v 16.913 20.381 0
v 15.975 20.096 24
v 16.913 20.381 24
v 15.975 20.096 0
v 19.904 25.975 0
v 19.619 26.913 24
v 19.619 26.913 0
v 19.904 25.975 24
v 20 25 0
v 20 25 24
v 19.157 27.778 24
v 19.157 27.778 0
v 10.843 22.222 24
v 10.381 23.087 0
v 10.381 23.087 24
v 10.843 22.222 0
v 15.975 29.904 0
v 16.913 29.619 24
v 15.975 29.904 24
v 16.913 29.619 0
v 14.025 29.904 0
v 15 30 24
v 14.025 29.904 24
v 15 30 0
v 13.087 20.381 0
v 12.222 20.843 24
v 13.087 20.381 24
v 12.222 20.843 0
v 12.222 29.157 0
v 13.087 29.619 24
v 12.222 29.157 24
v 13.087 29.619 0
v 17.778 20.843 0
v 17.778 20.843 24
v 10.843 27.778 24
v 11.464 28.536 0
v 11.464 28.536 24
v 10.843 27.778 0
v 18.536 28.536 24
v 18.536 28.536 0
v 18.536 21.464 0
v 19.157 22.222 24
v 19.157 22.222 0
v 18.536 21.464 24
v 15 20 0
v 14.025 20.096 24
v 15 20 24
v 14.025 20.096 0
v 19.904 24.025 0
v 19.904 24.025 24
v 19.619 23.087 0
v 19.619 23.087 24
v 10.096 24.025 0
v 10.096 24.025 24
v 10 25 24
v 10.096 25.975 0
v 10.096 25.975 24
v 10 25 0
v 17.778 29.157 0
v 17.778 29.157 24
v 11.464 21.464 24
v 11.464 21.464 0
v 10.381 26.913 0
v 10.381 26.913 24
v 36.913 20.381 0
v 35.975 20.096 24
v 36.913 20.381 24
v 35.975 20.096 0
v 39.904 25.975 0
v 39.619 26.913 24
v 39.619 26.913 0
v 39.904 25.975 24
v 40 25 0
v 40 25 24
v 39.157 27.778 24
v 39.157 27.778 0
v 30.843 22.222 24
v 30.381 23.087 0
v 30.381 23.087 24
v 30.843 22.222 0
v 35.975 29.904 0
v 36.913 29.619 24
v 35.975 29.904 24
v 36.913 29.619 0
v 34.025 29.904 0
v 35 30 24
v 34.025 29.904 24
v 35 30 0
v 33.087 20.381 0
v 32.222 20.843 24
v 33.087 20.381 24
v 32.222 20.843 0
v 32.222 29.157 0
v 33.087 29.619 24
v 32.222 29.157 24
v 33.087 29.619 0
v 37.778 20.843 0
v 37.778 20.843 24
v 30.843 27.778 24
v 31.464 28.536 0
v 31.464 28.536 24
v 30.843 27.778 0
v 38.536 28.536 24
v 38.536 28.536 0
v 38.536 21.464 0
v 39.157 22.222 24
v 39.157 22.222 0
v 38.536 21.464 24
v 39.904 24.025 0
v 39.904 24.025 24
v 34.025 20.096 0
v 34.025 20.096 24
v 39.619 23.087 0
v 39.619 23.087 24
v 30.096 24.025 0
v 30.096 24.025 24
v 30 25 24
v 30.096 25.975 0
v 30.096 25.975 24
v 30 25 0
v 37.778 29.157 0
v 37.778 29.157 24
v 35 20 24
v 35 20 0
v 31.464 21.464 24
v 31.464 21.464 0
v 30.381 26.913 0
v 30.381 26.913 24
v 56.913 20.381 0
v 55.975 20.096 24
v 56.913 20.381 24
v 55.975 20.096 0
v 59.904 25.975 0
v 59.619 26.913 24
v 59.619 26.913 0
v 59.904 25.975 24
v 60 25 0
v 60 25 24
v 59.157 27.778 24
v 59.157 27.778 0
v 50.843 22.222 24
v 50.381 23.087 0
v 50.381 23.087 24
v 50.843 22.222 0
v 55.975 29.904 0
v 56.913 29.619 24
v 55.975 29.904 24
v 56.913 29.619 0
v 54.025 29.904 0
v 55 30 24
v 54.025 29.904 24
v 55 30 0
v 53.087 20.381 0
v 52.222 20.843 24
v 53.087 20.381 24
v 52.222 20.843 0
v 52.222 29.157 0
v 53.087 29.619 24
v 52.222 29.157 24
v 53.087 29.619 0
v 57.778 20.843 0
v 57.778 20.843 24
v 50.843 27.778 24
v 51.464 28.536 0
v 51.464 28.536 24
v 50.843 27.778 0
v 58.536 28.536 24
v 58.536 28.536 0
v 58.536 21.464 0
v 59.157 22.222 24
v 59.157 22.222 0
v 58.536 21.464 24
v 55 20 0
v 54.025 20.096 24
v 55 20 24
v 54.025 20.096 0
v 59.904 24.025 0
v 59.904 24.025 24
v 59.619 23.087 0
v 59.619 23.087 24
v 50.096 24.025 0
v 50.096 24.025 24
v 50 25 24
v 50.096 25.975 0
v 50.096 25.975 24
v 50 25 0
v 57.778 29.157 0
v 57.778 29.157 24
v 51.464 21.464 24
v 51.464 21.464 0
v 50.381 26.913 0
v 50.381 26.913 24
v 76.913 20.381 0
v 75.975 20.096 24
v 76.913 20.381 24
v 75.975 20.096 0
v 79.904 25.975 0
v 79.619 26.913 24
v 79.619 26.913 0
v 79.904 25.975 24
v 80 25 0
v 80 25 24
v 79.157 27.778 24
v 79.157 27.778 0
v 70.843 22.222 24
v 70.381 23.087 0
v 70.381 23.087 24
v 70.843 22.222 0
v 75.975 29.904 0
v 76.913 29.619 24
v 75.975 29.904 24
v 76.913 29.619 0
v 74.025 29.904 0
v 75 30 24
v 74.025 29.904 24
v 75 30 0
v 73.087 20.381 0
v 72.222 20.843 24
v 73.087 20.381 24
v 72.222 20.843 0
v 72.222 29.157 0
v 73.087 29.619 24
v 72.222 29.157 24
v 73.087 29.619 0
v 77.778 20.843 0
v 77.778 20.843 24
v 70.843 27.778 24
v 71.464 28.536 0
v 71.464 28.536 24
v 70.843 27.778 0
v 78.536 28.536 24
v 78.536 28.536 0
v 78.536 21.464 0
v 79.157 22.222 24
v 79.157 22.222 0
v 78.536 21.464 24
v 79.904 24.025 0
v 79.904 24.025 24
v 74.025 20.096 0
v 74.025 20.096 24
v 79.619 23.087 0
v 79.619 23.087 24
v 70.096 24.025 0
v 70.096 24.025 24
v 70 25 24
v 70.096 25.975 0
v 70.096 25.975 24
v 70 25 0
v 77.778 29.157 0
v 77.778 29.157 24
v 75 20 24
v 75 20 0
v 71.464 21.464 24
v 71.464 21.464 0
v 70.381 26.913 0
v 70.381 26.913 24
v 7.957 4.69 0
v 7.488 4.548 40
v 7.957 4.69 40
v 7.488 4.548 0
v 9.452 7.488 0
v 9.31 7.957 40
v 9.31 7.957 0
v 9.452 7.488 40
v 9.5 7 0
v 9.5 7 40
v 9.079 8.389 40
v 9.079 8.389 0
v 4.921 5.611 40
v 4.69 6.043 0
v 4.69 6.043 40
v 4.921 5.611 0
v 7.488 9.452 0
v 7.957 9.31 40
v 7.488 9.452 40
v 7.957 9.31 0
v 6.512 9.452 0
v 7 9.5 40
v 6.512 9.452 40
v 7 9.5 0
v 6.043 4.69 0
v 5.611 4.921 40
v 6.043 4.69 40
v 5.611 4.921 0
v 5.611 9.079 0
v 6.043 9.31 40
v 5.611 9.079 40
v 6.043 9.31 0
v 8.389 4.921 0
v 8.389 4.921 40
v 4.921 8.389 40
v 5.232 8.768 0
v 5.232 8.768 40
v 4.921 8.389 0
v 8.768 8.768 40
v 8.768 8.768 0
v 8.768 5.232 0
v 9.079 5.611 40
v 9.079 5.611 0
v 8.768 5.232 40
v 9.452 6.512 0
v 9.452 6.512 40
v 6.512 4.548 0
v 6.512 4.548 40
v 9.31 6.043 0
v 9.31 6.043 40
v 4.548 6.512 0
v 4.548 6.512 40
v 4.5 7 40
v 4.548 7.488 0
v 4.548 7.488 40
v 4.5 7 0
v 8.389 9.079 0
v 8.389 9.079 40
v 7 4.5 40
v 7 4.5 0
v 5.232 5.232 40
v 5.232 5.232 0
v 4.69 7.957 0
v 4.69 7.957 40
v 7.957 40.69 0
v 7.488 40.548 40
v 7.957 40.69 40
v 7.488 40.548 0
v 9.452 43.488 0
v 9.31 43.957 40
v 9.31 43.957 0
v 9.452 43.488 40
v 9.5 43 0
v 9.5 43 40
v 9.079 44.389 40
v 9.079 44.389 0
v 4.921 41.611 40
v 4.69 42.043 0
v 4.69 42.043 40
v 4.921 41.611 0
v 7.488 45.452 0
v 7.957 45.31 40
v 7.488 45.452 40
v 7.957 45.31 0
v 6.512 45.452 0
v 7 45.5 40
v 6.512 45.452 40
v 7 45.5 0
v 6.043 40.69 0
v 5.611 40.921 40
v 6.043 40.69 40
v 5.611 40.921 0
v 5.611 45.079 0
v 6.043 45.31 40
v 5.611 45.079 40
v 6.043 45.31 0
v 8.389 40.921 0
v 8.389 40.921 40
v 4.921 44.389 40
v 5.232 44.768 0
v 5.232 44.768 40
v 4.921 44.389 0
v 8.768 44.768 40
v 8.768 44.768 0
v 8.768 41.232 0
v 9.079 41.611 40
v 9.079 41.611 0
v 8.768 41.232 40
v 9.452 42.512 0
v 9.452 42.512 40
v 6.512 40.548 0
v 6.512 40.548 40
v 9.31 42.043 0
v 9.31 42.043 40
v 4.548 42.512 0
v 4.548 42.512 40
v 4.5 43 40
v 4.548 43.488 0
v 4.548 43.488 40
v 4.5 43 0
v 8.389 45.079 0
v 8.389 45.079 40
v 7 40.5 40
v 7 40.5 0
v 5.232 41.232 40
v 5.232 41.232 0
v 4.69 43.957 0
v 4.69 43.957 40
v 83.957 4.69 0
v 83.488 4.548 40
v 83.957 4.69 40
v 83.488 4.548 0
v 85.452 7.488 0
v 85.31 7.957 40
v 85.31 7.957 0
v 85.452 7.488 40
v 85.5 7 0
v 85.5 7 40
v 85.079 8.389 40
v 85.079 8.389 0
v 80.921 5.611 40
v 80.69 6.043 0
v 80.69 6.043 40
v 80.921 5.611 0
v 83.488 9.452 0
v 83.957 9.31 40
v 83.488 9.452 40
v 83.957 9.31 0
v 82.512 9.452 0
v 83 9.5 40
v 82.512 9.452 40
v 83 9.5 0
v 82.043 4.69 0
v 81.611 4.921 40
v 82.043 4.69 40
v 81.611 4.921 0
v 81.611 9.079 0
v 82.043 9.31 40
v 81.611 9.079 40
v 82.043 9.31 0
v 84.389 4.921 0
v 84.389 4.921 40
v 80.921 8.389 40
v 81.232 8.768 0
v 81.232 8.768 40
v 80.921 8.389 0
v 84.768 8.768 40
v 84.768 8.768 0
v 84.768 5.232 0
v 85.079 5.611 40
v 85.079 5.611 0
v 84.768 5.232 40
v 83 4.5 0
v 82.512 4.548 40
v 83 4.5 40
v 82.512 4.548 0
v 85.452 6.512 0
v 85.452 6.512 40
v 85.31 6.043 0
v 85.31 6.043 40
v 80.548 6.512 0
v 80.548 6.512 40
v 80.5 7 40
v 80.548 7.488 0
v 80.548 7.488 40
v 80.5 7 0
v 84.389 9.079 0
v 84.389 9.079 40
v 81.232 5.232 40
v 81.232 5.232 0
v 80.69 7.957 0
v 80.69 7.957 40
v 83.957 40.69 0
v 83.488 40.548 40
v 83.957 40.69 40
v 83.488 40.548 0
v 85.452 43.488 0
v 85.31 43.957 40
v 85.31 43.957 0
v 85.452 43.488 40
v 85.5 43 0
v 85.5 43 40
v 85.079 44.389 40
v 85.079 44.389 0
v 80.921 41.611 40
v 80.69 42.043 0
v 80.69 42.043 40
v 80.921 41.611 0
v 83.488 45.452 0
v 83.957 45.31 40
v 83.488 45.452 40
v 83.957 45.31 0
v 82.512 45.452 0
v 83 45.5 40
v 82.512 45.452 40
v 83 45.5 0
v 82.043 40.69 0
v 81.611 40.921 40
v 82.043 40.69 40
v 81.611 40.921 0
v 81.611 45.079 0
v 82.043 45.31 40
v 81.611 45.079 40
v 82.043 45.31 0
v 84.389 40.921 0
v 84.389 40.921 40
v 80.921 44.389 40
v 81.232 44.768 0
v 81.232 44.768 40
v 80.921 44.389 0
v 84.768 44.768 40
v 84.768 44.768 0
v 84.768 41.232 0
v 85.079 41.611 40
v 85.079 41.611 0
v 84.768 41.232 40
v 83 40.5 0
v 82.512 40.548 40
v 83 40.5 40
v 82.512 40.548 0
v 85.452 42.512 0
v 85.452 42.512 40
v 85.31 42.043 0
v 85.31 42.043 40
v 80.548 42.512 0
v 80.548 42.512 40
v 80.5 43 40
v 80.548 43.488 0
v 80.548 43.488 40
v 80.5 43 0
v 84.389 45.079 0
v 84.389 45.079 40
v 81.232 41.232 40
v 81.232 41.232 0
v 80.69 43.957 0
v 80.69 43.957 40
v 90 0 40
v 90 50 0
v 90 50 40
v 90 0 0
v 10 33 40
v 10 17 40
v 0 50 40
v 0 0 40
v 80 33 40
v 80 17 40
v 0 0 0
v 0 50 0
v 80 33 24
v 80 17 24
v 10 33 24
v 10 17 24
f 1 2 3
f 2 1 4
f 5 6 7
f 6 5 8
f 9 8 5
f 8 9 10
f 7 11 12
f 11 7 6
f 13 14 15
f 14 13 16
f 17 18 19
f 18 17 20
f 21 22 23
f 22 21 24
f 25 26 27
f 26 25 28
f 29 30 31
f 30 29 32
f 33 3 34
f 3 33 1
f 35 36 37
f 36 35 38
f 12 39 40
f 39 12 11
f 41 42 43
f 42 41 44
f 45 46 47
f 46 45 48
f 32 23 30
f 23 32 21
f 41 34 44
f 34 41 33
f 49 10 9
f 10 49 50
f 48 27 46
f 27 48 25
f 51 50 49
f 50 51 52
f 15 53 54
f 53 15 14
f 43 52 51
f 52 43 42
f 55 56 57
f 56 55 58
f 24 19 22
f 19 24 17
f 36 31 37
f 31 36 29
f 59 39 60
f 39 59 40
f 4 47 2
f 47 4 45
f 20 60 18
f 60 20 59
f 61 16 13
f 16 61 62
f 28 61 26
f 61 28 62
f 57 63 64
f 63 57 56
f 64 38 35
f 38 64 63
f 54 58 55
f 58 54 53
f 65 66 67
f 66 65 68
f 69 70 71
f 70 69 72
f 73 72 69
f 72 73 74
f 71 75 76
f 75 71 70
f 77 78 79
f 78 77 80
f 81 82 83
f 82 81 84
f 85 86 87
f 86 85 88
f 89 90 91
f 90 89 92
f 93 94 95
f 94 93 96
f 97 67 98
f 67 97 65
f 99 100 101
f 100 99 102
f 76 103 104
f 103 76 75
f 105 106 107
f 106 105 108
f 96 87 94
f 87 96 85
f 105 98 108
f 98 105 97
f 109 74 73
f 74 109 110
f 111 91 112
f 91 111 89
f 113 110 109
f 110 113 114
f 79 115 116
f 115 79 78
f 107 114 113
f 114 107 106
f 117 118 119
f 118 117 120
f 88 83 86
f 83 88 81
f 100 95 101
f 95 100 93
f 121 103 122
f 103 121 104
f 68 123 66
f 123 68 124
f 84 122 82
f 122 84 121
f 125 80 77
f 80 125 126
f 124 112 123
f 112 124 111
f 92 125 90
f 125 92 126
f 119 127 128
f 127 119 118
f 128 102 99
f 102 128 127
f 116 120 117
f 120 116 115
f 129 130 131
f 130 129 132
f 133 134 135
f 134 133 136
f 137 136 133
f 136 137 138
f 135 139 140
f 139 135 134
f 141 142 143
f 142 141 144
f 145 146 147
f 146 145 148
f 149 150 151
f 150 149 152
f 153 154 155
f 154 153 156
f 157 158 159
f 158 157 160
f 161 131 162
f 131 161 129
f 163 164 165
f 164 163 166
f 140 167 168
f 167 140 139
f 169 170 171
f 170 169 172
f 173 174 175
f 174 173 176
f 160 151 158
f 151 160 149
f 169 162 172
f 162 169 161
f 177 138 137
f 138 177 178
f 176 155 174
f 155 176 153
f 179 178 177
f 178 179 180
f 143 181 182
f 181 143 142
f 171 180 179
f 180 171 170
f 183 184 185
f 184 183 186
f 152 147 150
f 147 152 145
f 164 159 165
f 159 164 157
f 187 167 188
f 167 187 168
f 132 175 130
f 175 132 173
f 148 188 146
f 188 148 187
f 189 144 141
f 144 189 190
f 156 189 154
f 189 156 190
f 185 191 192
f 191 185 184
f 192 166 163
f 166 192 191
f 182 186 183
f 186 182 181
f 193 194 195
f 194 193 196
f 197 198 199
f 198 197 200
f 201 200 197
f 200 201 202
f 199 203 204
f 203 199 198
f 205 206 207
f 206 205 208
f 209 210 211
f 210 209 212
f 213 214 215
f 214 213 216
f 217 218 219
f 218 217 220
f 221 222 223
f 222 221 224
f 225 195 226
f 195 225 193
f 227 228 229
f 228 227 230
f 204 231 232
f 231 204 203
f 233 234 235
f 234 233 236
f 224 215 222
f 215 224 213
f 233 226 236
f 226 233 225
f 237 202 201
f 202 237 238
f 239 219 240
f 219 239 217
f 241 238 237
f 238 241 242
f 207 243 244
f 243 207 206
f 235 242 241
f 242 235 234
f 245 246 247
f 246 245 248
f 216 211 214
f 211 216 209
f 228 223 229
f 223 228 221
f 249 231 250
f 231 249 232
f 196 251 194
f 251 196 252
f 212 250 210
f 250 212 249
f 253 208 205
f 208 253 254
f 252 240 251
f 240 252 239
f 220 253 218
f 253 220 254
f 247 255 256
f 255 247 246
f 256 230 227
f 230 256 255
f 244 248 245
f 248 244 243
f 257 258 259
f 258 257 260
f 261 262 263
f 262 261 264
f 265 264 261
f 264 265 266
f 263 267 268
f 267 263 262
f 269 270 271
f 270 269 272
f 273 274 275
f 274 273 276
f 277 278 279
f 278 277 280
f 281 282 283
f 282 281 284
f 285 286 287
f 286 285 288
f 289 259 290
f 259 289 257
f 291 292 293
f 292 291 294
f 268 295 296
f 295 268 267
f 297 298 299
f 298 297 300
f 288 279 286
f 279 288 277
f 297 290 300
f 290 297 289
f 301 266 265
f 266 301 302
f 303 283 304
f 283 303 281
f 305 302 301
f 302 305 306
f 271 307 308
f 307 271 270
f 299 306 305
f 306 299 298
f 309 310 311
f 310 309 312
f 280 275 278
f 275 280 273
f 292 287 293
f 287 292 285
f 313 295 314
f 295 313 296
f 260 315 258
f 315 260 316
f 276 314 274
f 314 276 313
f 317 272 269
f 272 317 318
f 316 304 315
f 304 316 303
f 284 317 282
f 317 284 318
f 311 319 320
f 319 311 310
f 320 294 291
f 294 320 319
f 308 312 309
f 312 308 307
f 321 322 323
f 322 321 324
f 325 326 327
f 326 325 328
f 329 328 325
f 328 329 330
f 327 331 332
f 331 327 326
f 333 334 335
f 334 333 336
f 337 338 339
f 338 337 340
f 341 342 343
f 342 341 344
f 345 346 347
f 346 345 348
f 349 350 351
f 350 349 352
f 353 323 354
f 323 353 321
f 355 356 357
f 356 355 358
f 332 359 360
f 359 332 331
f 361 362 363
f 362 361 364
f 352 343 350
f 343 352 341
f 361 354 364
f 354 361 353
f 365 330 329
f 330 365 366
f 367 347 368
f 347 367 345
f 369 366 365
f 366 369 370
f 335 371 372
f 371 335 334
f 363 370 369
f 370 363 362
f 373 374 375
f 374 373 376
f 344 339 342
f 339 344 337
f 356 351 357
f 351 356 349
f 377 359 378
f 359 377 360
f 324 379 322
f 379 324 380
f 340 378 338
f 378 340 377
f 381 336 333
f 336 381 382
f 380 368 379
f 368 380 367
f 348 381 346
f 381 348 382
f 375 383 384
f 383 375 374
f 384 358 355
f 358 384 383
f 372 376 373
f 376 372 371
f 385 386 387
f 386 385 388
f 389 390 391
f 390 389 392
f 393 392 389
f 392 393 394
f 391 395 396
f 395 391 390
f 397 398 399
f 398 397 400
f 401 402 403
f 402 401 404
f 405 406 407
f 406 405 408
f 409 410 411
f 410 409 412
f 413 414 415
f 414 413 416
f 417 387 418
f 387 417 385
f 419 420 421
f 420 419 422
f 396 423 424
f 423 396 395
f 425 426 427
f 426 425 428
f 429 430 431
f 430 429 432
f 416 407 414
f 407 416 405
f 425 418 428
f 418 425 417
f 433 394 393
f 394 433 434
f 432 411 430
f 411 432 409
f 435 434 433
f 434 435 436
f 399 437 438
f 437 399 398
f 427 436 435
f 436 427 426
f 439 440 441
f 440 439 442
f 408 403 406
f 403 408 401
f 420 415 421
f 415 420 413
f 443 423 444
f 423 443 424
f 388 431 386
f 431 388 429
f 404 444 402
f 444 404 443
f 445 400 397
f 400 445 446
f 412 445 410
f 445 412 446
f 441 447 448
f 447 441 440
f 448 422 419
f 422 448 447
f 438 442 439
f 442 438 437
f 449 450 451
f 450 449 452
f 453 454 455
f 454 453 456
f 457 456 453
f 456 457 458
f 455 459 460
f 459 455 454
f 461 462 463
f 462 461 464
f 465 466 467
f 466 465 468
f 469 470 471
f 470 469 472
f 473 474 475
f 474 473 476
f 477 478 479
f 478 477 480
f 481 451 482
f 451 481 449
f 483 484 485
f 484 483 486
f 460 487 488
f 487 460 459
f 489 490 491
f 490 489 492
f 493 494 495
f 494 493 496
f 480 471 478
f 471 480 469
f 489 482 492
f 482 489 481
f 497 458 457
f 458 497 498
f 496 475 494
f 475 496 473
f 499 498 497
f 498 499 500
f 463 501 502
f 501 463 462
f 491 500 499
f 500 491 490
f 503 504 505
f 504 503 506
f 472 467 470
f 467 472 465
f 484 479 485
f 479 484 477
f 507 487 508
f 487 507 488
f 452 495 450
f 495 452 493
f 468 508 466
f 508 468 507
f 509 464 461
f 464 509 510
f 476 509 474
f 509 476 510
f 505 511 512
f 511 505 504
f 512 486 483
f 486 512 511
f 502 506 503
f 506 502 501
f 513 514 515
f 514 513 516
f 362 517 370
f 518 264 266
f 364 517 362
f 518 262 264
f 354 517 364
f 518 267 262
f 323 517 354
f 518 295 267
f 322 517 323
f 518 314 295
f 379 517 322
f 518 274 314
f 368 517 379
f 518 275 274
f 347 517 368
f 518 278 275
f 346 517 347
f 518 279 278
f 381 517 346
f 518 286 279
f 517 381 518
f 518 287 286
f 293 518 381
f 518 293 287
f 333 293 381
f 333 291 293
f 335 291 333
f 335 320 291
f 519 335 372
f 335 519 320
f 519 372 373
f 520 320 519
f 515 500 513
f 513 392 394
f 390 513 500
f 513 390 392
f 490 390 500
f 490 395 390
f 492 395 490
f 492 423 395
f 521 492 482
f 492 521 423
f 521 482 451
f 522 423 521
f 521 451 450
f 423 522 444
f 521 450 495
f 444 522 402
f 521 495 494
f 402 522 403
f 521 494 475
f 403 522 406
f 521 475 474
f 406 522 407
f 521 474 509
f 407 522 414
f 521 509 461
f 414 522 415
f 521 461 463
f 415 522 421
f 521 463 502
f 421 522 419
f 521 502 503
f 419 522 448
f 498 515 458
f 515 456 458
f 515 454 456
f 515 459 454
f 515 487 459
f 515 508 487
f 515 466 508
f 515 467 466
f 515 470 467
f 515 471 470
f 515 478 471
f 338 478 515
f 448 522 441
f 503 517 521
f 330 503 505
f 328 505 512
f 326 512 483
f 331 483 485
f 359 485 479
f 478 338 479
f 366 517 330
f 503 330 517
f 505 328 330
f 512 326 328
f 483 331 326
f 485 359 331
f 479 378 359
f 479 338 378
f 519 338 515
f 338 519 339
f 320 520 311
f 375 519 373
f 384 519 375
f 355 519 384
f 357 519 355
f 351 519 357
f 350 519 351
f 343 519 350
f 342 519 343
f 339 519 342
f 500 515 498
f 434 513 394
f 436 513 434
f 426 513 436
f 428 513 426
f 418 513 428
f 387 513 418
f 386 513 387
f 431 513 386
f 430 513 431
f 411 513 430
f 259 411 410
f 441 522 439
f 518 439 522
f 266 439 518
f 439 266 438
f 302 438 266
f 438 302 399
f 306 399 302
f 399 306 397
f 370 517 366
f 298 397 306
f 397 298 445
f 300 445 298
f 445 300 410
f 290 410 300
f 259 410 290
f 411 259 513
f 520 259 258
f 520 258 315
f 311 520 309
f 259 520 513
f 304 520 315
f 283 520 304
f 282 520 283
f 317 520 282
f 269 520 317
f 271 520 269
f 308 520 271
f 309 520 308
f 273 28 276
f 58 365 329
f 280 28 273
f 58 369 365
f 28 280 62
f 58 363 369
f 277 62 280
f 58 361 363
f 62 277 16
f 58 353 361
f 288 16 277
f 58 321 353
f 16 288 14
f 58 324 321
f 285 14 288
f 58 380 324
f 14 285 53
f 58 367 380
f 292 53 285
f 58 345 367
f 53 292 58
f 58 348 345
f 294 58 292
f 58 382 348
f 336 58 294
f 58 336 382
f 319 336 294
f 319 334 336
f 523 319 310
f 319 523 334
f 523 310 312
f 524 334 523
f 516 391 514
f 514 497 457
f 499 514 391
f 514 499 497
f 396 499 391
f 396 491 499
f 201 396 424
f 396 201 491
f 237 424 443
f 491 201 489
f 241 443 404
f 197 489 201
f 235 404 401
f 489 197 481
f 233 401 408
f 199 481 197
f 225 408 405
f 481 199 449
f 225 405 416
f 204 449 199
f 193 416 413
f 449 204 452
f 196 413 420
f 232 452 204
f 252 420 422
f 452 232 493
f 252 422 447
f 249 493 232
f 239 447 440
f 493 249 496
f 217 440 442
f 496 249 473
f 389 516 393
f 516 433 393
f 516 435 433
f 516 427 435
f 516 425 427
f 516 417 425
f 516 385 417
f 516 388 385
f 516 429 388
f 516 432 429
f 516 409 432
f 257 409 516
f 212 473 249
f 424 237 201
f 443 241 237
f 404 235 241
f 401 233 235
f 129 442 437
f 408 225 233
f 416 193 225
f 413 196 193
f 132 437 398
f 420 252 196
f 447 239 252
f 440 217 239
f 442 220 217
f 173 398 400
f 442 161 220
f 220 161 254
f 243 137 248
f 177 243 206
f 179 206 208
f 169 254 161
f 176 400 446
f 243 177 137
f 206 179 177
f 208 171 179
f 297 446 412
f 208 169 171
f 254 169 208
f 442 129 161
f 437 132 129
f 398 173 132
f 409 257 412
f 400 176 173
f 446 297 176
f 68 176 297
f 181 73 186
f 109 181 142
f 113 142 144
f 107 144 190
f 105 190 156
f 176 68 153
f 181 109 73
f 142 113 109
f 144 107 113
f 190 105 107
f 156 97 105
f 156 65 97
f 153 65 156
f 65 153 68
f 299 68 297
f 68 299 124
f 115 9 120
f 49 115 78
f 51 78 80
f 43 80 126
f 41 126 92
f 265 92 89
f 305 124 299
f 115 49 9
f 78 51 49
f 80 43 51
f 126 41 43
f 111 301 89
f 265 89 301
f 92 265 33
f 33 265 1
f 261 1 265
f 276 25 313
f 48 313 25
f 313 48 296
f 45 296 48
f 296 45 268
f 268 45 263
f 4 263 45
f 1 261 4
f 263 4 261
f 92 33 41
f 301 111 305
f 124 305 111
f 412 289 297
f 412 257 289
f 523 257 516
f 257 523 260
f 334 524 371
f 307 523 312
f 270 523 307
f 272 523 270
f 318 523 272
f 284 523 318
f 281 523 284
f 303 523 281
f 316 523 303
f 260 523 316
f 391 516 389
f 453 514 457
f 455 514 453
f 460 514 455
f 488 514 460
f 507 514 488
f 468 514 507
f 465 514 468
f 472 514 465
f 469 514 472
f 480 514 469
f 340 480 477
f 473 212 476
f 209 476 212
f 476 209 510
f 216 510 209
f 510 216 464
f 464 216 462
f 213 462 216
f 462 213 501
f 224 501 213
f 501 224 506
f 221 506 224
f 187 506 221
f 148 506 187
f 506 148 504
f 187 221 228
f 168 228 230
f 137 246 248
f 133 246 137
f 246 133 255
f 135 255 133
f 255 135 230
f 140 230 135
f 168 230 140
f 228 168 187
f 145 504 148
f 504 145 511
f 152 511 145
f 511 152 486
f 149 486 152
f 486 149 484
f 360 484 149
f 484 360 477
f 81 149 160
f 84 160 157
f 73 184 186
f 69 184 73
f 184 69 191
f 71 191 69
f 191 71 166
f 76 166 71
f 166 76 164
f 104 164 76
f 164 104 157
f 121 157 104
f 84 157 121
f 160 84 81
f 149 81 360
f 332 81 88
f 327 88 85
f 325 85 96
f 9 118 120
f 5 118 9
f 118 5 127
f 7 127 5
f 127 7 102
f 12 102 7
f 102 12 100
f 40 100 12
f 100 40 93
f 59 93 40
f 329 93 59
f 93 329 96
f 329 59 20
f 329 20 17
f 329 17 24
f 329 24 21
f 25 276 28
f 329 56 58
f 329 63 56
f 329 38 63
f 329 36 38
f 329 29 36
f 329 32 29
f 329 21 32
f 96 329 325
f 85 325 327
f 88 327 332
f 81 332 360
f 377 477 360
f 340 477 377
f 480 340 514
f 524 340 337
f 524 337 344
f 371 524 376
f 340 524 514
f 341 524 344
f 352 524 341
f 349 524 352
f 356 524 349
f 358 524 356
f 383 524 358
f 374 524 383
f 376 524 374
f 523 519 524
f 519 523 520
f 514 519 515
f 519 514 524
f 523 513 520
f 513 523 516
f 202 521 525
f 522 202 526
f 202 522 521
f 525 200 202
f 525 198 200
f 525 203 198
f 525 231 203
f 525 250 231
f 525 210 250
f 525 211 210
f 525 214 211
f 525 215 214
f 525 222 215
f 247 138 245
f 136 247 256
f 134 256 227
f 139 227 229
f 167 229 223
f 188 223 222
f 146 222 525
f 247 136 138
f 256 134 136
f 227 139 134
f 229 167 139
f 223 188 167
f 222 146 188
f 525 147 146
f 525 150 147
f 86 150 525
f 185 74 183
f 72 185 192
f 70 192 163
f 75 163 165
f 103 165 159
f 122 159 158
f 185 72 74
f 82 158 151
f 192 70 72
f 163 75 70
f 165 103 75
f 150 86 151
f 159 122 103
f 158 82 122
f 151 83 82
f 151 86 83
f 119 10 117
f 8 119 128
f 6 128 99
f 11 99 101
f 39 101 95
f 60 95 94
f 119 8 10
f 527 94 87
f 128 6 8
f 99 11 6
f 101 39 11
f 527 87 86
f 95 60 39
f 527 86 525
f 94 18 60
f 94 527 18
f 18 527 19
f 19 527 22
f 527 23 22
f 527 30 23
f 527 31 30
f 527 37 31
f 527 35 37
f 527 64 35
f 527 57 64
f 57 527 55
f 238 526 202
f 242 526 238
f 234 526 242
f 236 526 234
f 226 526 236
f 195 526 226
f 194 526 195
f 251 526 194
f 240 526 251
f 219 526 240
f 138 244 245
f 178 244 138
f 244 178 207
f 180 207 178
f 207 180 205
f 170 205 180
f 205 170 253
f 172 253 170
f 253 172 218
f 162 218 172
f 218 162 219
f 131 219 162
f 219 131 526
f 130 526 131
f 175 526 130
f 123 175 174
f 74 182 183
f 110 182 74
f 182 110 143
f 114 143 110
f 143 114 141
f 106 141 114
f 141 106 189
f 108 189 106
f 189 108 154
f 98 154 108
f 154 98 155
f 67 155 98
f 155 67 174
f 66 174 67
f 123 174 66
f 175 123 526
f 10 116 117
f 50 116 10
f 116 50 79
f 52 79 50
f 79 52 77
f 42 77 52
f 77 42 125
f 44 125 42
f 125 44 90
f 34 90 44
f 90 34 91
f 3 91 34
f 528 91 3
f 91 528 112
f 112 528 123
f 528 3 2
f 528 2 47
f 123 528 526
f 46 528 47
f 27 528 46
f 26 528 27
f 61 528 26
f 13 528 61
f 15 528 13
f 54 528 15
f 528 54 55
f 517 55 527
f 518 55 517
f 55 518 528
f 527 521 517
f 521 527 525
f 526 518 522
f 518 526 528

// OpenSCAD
$fn = 32;

// ----------------------------------------------------------------------
// Manifold block: gallery_top manifold
// ----------------------------------------------------------------------

// --- parameters (mm) ---
block_l = 90;             // block length, X
block_w = 50;             // block width, Y
block_h = 40;             // block height, Z
port_d = 10;              // port bore diameter
port_pitch = 20;          // port pitch along X
gallery_d = 16;           // top gallery width, Y
gallery_depth = 16;       // gallery pocket depth
wall_p = 10;              // gallery end wall thickness, X
mnt_d = 5;                // mounting hole diameter
mnt_in = 7;               // mounting hole inset from the edges

n_ports = 4;  // ports in the row
port_x0 = (block_l - (n_ports - 1) * port_pitch) / 2;  // first port X

difference() {
  cube([block_l, block_w, block_h]);
  for (i = [0 : n_ports - 1])
    translate([port_x0 + i * port_pitch, block_w / 2, -1])
      cylinder(h = block_h + 2, d = port_d);
  translate([wall_p, block_w / 2 - gallery_d / 2, block_h - gallery_depth])
    cube([block_l - 2 * wall_p, gallery_d, gallery_depth + 1]);
  for (cx = [mnt_in, block_l - mnt_in])
    for (cy = [mnt_in, block_w - mnt_in])
      translate([cx, cy, -1]) cylinder(h = block_h + 2, d = mnt_d);
}
